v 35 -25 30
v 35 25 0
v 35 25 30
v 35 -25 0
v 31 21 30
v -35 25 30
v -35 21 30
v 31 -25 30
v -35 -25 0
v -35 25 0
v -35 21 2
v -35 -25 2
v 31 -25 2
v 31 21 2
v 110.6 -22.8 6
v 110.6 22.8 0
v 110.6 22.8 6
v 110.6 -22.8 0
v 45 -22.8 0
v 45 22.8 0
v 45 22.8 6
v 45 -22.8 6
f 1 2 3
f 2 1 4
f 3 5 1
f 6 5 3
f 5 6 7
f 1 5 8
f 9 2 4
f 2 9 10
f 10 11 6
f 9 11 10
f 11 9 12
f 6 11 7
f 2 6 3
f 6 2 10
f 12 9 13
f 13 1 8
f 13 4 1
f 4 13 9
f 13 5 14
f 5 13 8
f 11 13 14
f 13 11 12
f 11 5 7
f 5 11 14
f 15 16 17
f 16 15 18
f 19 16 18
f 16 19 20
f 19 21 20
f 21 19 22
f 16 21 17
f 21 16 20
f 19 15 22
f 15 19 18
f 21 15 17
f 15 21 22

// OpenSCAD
// Two-part enclosure for a small electronics board (e.g., Arduino-based temperature logger)
// Print orientation: both parts rest on the bed (z = 0), side by side on the XY plane.
// The lid is printed upside down: a flat plate on the bed with a wall (lip) rising in +Z,
// so it slides into the open-top box. A 10 mm gap between the parts prevents fusion.
//
// Author: [your name]
// Date   : [today's date]
// Notes  : Measure each part again after printing to check for warping or shrinkage.

// ---------------- Parameters ----------------
box_x      = 70;    // box outer length (X)
box_y      = 50;    // box outer width (Y)
box_z      = 30;    // box outer height (Z)
wall       = 2;     // box wall thickness
floor      = 2;     // box floor thickness
eps        = 0.5;   // cutter overshoot past faces

lid_t      = 2;     // lid plate thickness
lip_h      = 4;     // lid lip (wall) height
lip_w      = 65.6;  // lip outer length (X)
lip_d      = 45.6;  // lip outer width (Y)
lip_over   = 0.2;   // lip overlap into box opening (clearance on each side)

gap        = 10;    // horizontal gap between box and lid
$fn        = 64;    // curve resolution (no curved features here; kept per convention)

// Derived
lip_t = wall;       // lip thickness equals wall thickness (30-degree rule)

// ---------------- Model ----------------
union() {
    // Part 1: open-top box
    translate([-box_x/2, -box_y/2, 0])
        difference() {
            cube([box_x, box_y, box_z]);
            translate([0, 0, floor])
                cube([box_x - 2*wall, box_y - 2*wall, box_z - floor + eps]);
        }

    // Part 2: lid (printed upside down)
    translate([box_x/2 + gap, -lip_d/2, 0])
        cube([lip_w, lip_d, lid_t]);

    // Lip on top of the lid plate
    translate([box_x/2 + gap, -lip_d/2, lid_t])
        cube([lip_w, lip_d, lip_h]);
}
